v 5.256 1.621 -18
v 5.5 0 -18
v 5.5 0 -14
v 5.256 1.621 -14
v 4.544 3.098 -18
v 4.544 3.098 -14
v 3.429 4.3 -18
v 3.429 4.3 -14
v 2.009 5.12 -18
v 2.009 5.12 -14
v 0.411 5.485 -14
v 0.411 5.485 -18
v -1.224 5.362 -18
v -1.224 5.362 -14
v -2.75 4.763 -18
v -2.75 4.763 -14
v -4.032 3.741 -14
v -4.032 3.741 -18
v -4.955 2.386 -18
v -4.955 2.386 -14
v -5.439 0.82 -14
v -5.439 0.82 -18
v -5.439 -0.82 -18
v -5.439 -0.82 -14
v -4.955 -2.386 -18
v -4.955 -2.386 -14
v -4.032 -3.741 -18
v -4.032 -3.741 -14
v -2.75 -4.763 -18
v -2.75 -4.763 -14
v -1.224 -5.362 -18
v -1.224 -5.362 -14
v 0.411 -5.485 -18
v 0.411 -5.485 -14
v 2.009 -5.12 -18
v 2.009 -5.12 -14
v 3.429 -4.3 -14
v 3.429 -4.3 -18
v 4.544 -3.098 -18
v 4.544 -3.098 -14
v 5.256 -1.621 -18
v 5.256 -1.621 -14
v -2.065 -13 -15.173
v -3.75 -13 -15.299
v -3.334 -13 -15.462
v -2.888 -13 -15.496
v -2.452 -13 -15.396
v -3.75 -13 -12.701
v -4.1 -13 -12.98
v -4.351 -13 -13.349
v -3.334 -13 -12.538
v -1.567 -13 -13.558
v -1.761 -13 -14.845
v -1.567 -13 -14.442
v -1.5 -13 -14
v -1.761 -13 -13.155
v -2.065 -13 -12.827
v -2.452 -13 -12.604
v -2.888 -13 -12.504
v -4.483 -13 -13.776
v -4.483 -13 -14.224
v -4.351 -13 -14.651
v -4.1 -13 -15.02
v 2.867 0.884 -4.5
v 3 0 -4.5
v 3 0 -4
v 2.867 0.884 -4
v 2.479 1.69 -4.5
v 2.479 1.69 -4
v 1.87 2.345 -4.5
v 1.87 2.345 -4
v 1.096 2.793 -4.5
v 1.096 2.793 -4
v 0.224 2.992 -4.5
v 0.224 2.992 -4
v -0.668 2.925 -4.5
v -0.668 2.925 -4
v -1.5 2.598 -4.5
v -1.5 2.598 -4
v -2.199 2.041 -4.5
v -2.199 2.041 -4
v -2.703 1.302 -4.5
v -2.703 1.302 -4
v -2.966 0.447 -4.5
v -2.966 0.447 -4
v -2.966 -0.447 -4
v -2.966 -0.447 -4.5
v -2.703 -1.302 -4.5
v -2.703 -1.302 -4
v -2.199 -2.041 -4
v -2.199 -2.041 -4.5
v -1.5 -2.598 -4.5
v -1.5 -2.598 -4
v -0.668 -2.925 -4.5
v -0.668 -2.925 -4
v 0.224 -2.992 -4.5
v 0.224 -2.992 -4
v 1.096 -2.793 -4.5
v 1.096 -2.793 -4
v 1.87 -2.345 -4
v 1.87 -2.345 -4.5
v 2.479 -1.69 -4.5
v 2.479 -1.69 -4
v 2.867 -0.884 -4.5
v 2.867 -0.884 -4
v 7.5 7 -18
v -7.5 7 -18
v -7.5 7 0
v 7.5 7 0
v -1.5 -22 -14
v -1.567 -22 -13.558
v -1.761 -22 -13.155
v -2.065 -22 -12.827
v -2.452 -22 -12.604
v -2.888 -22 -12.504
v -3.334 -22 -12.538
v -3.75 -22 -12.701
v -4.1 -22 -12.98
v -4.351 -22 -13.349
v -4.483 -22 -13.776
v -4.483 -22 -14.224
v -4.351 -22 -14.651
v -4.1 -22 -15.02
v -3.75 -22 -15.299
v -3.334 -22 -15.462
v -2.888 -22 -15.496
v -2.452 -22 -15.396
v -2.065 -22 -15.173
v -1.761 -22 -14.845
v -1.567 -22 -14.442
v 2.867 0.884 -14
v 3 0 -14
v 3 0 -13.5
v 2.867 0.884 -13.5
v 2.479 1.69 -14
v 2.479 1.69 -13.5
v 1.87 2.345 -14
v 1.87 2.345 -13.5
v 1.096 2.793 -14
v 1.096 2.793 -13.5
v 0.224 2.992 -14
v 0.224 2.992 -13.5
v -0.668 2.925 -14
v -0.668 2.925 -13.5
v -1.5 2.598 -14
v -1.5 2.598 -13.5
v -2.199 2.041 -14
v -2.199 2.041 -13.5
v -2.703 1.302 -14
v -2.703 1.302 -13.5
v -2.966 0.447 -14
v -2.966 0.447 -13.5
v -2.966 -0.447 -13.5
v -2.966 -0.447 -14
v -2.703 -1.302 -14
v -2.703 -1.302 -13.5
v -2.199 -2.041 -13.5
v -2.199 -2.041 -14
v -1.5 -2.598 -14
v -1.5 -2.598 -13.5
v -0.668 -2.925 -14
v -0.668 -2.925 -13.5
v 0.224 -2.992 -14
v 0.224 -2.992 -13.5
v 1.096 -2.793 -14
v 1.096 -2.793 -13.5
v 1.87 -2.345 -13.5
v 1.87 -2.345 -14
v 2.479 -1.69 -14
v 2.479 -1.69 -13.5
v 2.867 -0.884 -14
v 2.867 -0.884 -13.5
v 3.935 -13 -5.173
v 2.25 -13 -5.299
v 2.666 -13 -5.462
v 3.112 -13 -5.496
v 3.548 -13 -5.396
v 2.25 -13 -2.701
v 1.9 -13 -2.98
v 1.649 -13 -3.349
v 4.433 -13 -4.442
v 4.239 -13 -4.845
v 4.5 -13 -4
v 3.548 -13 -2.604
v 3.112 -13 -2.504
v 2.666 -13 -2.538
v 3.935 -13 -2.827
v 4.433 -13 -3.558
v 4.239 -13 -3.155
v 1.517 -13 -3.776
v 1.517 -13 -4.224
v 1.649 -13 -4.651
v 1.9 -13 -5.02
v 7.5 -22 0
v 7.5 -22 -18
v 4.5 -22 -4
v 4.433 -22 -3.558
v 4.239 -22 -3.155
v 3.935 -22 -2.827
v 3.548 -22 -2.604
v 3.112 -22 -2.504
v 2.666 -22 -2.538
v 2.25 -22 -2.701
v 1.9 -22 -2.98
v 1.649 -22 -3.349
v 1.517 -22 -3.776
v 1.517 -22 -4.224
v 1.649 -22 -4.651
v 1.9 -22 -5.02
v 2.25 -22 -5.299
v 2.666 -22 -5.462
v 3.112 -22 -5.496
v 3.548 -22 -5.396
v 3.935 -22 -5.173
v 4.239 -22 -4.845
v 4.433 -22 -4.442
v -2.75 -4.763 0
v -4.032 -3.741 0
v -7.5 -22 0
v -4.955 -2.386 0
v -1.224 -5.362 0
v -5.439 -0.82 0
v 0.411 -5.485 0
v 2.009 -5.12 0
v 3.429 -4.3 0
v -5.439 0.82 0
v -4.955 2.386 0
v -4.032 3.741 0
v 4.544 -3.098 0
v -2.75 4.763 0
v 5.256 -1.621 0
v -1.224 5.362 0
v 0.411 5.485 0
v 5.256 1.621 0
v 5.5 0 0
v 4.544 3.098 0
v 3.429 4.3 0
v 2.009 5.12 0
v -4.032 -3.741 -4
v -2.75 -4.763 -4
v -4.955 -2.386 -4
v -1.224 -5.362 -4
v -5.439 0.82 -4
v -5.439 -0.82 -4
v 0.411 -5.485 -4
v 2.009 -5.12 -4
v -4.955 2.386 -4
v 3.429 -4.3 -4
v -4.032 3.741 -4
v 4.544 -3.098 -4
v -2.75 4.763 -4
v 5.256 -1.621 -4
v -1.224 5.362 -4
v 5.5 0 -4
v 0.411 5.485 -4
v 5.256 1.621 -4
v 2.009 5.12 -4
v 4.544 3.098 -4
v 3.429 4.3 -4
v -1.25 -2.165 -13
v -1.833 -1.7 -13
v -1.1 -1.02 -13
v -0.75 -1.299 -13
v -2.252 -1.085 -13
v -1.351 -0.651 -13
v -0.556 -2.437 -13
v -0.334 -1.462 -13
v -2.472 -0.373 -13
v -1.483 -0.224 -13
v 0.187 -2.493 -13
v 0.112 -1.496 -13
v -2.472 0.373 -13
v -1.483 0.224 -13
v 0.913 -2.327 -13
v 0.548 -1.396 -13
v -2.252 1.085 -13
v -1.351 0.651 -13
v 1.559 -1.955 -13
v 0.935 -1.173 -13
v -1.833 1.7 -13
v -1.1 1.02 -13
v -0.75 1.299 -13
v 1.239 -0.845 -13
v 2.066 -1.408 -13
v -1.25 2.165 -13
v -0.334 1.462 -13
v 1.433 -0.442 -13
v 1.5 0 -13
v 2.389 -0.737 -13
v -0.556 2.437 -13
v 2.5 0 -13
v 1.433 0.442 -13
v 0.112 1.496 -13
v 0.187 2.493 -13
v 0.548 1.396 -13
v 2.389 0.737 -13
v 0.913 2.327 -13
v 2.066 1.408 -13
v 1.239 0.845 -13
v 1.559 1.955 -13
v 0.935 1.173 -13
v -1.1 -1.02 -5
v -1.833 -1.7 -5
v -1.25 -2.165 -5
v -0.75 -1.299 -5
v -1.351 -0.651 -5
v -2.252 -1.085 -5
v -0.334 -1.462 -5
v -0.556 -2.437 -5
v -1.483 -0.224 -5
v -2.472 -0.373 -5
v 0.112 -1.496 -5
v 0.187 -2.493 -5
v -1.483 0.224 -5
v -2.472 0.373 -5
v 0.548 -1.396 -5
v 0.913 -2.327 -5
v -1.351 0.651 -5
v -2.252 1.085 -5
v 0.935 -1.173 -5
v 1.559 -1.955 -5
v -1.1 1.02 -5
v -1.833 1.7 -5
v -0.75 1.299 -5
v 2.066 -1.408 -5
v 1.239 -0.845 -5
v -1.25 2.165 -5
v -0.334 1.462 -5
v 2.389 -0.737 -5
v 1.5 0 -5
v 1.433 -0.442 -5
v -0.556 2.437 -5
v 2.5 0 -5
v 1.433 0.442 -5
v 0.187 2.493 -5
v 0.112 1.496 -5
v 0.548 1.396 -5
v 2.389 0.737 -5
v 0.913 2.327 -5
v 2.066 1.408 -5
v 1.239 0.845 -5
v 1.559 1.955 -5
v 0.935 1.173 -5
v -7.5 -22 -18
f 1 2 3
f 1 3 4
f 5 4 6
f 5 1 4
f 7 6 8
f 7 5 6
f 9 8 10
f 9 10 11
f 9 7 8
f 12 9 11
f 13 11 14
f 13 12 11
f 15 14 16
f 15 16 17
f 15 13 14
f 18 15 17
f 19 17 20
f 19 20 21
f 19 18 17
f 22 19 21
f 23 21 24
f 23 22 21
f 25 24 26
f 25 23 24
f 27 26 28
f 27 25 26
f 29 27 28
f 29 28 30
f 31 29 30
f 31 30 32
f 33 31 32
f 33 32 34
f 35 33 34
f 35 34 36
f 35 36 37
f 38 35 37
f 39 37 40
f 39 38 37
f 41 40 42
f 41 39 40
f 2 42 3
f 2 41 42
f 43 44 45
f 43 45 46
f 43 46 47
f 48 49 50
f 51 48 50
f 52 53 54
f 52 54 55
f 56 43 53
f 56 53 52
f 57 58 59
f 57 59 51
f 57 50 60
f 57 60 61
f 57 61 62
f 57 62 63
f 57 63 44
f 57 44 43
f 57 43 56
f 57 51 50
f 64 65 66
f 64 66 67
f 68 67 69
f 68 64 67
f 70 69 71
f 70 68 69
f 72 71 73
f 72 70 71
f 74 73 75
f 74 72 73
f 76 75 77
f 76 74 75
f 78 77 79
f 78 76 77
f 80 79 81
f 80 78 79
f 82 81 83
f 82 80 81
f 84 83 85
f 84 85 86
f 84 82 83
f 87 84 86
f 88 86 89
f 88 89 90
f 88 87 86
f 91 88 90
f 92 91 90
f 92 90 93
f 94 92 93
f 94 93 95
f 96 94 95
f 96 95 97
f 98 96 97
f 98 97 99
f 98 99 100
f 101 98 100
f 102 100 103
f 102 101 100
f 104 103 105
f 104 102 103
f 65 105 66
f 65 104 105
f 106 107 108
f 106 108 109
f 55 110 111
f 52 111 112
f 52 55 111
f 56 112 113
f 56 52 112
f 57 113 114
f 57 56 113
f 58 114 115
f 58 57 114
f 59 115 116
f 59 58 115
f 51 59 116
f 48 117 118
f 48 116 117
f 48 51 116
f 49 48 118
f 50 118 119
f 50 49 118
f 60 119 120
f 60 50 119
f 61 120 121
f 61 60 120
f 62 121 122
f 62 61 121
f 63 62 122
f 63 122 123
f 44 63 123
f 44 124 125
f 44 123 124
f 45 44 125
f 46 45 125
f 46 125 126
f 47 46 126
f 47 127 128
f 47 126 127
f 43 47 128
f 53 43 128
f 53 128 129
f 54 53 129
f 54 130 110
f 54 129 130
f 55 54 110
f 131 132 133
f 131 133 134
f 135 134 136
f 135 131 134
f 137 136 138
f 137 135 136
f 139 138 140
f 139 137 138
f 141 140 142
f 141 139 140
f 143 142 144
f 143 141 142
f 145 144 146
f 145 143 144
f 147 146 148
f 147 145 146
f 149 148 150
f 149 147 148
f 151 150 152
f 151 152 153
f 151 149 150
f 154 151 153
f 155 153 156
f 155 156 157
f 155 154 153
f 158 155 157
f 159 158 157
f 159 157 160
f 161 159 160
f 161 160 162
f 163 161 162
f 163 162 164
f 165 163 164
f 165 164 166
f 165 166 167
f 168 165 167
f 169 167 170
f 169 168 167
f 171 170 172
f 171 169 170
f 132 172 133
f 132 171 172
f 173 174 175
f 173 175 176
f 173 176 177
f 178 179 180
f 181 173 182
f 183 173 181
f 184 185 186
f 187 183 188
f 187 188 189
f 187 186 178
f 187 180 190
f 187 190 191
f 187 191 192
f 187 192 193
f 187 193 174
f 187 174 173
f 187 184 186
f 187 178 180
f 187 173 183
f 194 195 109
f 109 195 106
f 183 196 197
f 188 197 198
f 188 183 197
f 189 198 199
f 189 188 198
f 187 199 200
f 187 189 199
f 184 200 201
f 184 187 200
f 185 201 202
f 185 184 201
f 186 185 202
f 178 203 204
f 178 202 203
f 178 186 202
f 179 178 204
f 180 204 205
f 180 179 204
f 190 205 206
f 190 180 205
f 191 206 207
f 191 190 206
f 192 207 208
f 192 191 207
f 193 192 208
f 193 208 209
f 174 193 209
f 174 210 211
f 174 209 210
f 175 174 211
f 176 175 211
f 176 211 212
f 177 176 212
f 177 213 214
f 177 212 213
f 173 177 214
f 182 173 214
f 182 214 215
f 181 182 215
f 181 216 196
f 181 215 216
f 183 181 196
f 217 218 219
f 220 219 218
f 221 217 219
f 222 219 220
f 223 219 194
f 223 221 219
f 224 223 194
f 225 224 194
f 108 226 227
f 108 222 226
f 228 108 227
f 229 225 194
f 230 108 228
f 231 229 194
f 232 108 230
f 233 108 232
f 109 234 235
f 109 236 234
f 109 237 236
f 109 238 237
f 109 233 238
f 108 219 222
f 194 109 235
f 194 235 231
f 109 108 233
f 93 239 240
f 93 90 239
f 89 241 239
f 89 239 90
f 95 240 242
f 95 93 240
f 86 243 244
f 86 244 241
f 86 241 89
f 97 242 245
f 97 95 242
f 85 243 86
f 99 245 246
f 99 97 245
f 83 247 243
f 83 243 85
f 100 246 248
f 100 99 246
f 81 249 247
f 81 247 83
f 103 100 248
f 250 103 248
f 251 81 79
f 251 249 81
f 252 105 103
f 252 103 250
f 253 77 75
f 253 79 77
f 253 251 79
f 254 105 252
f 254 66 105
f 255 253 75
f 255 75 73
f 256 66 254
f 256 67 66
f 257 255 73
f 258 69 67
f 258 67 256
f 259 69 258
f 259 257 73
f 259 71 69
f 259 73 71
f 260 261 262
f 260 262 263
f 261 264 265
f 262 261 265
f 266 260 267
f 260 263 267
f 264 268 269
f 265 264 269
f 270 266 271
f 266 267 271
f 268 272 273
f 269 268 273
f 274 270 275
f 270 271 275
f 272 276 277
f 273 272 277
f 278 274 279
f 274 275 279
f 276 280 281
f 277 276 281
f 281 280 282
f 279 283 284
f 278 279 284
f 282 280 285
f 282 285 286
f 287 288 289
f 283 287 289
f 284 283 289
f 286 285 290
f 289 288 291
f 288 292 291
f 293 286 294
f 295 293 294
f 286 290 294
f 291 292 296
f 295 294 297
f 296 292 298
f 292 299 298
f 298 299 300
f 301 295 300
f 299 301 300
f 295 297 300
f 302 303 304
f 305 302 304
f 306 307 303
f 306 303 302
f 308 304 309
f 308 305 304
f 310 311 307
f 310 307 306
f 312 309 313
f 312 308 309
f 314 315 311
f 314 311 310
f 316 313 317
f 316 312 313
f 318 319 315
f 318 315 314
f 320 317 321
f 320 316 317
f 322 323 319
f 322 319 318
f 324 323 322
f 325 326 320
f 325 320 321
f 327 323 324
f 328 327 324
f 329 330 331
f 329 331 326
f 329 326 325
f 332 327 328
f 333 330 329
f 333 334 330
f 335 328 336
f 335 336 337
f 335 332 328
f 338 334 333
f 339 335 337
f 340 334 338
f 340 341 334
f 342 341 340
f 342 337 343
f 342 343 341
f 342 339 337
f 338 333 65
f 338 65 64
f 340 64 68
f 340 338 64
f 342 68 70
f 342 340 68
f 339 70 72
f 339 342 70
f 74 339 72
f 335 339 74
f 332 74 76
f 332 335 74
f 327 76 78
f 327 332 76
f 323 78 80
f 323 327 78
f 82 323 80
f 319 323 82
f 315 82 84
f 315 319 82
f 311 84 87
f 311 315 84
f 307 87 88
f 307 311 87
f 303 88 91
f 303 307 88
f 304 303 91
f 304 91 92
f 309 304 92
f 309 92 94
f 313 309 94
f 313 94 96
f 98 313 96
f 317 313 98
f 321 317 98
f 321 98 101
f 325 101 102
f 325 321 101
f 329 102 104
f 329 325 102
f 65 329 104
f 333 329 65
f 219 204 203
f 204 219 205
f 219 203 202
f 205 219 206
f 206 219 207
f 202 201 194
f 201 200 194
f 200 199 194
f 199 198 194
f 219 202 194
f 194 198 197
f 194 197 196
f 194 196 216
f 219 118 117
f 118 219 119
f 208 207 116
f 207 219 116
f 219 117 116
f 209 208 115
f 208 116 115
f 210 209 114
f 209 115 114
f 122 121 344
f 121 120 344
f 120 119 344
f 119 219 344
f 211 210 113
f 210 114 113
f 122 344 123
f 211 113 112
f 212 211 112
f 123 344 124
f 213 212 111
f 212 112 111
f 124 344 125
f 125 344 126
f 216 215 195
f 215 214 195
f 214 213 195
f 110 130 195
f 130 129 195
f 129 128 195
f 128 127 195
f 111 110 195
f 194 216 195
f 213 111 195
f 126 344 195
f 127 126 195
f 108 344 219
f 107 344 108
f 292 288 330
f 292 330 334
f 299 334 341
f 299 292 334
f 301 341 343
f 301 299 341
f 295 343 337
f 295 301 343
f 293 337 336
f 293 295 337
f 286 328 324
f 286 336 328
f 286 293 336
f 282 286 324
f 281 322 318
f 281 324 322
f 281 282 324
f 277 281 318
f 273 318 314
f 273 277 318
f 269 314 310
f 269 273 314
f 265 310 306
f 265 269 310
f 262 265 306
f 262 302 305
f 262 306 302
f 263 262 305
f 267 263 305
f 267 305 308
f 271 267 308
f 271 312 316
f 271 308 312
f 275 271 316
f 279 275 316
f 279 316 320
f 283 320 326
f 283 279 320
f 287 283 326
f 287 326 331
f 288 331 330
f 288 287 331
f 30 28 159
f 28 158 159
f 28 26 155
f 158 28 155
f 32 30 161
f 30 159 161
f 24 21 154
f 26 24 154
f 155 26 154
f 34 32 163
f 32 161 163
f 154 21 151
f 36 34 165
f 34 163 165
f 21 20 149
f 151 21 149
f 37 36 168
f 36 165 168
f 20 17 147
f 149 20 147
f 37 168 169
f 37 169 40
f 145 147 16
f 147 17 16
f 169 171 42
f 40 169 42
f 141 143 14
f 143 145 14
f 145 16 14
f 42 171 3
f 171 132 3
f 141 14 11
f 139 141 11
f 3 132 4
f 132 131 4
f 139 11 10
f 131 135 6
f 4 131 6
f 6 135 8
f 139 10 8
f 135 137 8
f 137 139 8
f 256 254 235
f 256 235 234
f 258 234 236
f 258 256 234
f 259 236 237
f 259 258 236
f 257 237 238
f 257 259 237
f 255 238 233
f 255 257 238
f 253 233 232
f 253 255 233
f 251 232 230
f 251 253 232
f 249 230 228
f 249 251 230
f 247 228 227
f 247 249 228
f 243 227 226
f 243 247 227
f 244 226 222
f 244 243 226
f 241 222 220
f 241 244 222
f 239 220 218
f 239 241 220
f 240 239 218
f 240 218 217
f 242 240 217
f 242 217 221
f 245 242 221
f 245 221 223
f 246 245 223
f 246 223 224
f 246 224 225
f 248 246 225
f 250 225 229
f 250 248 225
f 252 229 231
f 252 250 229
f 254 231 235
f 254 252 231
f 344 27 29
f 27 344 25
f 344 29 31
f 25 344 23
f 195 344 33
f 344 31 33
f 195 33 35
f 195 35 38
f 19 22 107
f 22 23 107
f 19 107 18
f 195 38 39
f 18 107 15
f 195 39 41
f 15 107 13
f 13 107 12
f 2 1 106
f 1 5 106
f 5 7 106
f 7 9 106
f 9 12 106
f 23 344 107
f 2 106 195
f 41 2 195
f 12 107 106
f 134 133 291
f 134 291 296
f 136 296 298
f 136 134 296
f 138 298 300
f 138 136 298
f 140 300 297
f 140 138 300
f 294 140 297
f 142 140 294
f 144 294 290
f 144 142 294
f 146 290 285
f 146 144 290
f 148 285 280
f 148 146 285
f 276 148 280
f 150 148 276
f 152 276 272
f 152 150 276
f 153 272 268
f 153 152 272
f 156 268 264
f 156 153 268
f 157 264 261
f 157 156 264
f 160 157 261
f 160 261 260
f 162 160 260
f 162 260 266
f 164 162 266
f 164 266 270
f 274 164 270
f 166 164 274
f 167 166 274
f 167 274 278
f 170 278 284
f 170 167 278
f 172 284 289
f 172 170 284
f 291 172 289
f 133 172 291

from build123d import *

# Parameters (mm, degrees)
CYLINDER095_R      = 1.5
CYLINDER095_DEPTH  = 21
CYLINDER094_R      = 1.5
CYLINDER094_DEPTH  = 21
CYLINDER085_R      = 1.5
CYLINDER085_DEPTH  = 12
CYLINDER088_R      = 3
CYLINDER088_DEPTH  = 1
CYLINDER089_R      = 3
CYLINDER089_DEPTH  = 1
CYLINDER087_R      = 5.5
CYLINDER087_DEPTH  = 4
CYLINDER086_R      = 5.5
CYLINDER086_DEPTH  = 4
BOX406008013_W     = 15
BOX406008013_H     = 29
BOX406008013_DEPTH = 18
CHAMFER_SIZE       = 0.5
CHAMFER001_SIZE    = 0.5


with BuildPart() as cylinder095:
    # Cylinder095 → Cylinder095 (new body)
    with BuildSketch(Plane(origin=(3, -13, -4), x_dir=(1, 0, 0), z_dir=(0, -1, 0))):
        Circle(CYLINDER095_R)
    extrude(amount=CYLINDER095_DEPTH)


with BuildPart() as fusion103077013004017014:
    # Cylinder094 → Cylinder094 (new body)
    with BuildSketch(Plane(origin=(-3, -13, -14), x_dir=(1, 0, 0), z_dir=(0, -1, 0))):
        Circle(CYLINDER094_R)
    extrude(amount=CYLINDER094_DEPTH)

    # Fusion103077013004017014: union Cylinder095
    add(cylinder095.part)


with BuildPart() as cylinder081:
    # Cylinder085 → Cylinder085 (new body)
    with BuildSketch(Plane.XY.offset(-14)):
        Circle(CYLINDER085_R)
    extrude(amount=CYLINDER085_DEPTH)


with BuildPart() as cylinder082:
    # Cylinder088 → Cylinder088 (new body)
    with BuildSketch(Plane.XY.offset(-5)):
        Circle(CYLINDER088_R)
    extrude(amount=CYLINDER088_DEPTH)


with BuildPart() as fusion103077013004017009:
    # Cylinder089 → Cylinder089 (new body)
    with BuildSketch(Plane.XY.offset(-14)):
        Circle(CYLINDER089_R)
    extrude(amount=CYLINDER089_DEPTH)

    # Fusion103077013004017009: union Cylinder082
    add(cylinder082.part)


with BuildPart() as f_623_bearing003:
    # Cylinder087 → Cylinder087 (new body)
    with BuildSketch(Plane.XY.offset(-18)):
        Circle(CYLINDER087_R)
    extrude(amount=CYLINDER087_DEPTH)


with BuildPart() as f_623_bearing_holes:
    # Cylinder086 → Cylinder086 (new body)
    with BuildSketch(Plane.XY.offset(-4)):
        Circle(CYLINDER086_R)
    extrude(amount=CYLINDER086_DEPTH)

    # Fusion103077013004017008: union 623 Bearing003
    add(f_623_bearing003.part)


with BuildPart() as bearing_mount_end:
    # Box406008013 → Box406008013 (new body)
    with BuildSketch(Plane(origin=(-7.5, -22, -18), x_dir=(1, 0, 0), z_dir=(0, 0, 1))):
        with Locations((7.5, 14.5)):
            Rectangle(BOX406008013_W, BOX406008013_H)
    extrude(amount=BOX406008013_DEPTH)

    # Cut070: cut 623 Bearing Holes
    add(f_623_bearing_holes.part, mode=Mode.SUBTRACT)

    # Cut071: cut Fusion103077013004017009
    add(fusion103077013004017009.part, mode=Mode.SUBTRACT)

    # Cut072: cut Cylinder081
    add(cylinder081.part, mode=Mode.SUBTRACT)

    # Chamfer
    chamfer_edges = [bearing_mount_end.edges().sort_by_distance(p)[0] for p in [
        (-3, 0, -5),
    ]]
    chamfer(chamfer_edges, length=CHAMFER_SIZE)

    # Chamfer001
    chamfer001_edges = [bearing_mount_end.edges().sort_by_distance(p)[0] for p in [
        (-3, 0, -13),
    ]]
    chamfer(chamfer001_edges, length=CHAMFER001_SIZE)

    # Cut078: cut Fusion103077013004017014
    add(fusion103077013004017014.part, mode=Mode.SUBTRACT)


solid = bearing_mount_end.part
